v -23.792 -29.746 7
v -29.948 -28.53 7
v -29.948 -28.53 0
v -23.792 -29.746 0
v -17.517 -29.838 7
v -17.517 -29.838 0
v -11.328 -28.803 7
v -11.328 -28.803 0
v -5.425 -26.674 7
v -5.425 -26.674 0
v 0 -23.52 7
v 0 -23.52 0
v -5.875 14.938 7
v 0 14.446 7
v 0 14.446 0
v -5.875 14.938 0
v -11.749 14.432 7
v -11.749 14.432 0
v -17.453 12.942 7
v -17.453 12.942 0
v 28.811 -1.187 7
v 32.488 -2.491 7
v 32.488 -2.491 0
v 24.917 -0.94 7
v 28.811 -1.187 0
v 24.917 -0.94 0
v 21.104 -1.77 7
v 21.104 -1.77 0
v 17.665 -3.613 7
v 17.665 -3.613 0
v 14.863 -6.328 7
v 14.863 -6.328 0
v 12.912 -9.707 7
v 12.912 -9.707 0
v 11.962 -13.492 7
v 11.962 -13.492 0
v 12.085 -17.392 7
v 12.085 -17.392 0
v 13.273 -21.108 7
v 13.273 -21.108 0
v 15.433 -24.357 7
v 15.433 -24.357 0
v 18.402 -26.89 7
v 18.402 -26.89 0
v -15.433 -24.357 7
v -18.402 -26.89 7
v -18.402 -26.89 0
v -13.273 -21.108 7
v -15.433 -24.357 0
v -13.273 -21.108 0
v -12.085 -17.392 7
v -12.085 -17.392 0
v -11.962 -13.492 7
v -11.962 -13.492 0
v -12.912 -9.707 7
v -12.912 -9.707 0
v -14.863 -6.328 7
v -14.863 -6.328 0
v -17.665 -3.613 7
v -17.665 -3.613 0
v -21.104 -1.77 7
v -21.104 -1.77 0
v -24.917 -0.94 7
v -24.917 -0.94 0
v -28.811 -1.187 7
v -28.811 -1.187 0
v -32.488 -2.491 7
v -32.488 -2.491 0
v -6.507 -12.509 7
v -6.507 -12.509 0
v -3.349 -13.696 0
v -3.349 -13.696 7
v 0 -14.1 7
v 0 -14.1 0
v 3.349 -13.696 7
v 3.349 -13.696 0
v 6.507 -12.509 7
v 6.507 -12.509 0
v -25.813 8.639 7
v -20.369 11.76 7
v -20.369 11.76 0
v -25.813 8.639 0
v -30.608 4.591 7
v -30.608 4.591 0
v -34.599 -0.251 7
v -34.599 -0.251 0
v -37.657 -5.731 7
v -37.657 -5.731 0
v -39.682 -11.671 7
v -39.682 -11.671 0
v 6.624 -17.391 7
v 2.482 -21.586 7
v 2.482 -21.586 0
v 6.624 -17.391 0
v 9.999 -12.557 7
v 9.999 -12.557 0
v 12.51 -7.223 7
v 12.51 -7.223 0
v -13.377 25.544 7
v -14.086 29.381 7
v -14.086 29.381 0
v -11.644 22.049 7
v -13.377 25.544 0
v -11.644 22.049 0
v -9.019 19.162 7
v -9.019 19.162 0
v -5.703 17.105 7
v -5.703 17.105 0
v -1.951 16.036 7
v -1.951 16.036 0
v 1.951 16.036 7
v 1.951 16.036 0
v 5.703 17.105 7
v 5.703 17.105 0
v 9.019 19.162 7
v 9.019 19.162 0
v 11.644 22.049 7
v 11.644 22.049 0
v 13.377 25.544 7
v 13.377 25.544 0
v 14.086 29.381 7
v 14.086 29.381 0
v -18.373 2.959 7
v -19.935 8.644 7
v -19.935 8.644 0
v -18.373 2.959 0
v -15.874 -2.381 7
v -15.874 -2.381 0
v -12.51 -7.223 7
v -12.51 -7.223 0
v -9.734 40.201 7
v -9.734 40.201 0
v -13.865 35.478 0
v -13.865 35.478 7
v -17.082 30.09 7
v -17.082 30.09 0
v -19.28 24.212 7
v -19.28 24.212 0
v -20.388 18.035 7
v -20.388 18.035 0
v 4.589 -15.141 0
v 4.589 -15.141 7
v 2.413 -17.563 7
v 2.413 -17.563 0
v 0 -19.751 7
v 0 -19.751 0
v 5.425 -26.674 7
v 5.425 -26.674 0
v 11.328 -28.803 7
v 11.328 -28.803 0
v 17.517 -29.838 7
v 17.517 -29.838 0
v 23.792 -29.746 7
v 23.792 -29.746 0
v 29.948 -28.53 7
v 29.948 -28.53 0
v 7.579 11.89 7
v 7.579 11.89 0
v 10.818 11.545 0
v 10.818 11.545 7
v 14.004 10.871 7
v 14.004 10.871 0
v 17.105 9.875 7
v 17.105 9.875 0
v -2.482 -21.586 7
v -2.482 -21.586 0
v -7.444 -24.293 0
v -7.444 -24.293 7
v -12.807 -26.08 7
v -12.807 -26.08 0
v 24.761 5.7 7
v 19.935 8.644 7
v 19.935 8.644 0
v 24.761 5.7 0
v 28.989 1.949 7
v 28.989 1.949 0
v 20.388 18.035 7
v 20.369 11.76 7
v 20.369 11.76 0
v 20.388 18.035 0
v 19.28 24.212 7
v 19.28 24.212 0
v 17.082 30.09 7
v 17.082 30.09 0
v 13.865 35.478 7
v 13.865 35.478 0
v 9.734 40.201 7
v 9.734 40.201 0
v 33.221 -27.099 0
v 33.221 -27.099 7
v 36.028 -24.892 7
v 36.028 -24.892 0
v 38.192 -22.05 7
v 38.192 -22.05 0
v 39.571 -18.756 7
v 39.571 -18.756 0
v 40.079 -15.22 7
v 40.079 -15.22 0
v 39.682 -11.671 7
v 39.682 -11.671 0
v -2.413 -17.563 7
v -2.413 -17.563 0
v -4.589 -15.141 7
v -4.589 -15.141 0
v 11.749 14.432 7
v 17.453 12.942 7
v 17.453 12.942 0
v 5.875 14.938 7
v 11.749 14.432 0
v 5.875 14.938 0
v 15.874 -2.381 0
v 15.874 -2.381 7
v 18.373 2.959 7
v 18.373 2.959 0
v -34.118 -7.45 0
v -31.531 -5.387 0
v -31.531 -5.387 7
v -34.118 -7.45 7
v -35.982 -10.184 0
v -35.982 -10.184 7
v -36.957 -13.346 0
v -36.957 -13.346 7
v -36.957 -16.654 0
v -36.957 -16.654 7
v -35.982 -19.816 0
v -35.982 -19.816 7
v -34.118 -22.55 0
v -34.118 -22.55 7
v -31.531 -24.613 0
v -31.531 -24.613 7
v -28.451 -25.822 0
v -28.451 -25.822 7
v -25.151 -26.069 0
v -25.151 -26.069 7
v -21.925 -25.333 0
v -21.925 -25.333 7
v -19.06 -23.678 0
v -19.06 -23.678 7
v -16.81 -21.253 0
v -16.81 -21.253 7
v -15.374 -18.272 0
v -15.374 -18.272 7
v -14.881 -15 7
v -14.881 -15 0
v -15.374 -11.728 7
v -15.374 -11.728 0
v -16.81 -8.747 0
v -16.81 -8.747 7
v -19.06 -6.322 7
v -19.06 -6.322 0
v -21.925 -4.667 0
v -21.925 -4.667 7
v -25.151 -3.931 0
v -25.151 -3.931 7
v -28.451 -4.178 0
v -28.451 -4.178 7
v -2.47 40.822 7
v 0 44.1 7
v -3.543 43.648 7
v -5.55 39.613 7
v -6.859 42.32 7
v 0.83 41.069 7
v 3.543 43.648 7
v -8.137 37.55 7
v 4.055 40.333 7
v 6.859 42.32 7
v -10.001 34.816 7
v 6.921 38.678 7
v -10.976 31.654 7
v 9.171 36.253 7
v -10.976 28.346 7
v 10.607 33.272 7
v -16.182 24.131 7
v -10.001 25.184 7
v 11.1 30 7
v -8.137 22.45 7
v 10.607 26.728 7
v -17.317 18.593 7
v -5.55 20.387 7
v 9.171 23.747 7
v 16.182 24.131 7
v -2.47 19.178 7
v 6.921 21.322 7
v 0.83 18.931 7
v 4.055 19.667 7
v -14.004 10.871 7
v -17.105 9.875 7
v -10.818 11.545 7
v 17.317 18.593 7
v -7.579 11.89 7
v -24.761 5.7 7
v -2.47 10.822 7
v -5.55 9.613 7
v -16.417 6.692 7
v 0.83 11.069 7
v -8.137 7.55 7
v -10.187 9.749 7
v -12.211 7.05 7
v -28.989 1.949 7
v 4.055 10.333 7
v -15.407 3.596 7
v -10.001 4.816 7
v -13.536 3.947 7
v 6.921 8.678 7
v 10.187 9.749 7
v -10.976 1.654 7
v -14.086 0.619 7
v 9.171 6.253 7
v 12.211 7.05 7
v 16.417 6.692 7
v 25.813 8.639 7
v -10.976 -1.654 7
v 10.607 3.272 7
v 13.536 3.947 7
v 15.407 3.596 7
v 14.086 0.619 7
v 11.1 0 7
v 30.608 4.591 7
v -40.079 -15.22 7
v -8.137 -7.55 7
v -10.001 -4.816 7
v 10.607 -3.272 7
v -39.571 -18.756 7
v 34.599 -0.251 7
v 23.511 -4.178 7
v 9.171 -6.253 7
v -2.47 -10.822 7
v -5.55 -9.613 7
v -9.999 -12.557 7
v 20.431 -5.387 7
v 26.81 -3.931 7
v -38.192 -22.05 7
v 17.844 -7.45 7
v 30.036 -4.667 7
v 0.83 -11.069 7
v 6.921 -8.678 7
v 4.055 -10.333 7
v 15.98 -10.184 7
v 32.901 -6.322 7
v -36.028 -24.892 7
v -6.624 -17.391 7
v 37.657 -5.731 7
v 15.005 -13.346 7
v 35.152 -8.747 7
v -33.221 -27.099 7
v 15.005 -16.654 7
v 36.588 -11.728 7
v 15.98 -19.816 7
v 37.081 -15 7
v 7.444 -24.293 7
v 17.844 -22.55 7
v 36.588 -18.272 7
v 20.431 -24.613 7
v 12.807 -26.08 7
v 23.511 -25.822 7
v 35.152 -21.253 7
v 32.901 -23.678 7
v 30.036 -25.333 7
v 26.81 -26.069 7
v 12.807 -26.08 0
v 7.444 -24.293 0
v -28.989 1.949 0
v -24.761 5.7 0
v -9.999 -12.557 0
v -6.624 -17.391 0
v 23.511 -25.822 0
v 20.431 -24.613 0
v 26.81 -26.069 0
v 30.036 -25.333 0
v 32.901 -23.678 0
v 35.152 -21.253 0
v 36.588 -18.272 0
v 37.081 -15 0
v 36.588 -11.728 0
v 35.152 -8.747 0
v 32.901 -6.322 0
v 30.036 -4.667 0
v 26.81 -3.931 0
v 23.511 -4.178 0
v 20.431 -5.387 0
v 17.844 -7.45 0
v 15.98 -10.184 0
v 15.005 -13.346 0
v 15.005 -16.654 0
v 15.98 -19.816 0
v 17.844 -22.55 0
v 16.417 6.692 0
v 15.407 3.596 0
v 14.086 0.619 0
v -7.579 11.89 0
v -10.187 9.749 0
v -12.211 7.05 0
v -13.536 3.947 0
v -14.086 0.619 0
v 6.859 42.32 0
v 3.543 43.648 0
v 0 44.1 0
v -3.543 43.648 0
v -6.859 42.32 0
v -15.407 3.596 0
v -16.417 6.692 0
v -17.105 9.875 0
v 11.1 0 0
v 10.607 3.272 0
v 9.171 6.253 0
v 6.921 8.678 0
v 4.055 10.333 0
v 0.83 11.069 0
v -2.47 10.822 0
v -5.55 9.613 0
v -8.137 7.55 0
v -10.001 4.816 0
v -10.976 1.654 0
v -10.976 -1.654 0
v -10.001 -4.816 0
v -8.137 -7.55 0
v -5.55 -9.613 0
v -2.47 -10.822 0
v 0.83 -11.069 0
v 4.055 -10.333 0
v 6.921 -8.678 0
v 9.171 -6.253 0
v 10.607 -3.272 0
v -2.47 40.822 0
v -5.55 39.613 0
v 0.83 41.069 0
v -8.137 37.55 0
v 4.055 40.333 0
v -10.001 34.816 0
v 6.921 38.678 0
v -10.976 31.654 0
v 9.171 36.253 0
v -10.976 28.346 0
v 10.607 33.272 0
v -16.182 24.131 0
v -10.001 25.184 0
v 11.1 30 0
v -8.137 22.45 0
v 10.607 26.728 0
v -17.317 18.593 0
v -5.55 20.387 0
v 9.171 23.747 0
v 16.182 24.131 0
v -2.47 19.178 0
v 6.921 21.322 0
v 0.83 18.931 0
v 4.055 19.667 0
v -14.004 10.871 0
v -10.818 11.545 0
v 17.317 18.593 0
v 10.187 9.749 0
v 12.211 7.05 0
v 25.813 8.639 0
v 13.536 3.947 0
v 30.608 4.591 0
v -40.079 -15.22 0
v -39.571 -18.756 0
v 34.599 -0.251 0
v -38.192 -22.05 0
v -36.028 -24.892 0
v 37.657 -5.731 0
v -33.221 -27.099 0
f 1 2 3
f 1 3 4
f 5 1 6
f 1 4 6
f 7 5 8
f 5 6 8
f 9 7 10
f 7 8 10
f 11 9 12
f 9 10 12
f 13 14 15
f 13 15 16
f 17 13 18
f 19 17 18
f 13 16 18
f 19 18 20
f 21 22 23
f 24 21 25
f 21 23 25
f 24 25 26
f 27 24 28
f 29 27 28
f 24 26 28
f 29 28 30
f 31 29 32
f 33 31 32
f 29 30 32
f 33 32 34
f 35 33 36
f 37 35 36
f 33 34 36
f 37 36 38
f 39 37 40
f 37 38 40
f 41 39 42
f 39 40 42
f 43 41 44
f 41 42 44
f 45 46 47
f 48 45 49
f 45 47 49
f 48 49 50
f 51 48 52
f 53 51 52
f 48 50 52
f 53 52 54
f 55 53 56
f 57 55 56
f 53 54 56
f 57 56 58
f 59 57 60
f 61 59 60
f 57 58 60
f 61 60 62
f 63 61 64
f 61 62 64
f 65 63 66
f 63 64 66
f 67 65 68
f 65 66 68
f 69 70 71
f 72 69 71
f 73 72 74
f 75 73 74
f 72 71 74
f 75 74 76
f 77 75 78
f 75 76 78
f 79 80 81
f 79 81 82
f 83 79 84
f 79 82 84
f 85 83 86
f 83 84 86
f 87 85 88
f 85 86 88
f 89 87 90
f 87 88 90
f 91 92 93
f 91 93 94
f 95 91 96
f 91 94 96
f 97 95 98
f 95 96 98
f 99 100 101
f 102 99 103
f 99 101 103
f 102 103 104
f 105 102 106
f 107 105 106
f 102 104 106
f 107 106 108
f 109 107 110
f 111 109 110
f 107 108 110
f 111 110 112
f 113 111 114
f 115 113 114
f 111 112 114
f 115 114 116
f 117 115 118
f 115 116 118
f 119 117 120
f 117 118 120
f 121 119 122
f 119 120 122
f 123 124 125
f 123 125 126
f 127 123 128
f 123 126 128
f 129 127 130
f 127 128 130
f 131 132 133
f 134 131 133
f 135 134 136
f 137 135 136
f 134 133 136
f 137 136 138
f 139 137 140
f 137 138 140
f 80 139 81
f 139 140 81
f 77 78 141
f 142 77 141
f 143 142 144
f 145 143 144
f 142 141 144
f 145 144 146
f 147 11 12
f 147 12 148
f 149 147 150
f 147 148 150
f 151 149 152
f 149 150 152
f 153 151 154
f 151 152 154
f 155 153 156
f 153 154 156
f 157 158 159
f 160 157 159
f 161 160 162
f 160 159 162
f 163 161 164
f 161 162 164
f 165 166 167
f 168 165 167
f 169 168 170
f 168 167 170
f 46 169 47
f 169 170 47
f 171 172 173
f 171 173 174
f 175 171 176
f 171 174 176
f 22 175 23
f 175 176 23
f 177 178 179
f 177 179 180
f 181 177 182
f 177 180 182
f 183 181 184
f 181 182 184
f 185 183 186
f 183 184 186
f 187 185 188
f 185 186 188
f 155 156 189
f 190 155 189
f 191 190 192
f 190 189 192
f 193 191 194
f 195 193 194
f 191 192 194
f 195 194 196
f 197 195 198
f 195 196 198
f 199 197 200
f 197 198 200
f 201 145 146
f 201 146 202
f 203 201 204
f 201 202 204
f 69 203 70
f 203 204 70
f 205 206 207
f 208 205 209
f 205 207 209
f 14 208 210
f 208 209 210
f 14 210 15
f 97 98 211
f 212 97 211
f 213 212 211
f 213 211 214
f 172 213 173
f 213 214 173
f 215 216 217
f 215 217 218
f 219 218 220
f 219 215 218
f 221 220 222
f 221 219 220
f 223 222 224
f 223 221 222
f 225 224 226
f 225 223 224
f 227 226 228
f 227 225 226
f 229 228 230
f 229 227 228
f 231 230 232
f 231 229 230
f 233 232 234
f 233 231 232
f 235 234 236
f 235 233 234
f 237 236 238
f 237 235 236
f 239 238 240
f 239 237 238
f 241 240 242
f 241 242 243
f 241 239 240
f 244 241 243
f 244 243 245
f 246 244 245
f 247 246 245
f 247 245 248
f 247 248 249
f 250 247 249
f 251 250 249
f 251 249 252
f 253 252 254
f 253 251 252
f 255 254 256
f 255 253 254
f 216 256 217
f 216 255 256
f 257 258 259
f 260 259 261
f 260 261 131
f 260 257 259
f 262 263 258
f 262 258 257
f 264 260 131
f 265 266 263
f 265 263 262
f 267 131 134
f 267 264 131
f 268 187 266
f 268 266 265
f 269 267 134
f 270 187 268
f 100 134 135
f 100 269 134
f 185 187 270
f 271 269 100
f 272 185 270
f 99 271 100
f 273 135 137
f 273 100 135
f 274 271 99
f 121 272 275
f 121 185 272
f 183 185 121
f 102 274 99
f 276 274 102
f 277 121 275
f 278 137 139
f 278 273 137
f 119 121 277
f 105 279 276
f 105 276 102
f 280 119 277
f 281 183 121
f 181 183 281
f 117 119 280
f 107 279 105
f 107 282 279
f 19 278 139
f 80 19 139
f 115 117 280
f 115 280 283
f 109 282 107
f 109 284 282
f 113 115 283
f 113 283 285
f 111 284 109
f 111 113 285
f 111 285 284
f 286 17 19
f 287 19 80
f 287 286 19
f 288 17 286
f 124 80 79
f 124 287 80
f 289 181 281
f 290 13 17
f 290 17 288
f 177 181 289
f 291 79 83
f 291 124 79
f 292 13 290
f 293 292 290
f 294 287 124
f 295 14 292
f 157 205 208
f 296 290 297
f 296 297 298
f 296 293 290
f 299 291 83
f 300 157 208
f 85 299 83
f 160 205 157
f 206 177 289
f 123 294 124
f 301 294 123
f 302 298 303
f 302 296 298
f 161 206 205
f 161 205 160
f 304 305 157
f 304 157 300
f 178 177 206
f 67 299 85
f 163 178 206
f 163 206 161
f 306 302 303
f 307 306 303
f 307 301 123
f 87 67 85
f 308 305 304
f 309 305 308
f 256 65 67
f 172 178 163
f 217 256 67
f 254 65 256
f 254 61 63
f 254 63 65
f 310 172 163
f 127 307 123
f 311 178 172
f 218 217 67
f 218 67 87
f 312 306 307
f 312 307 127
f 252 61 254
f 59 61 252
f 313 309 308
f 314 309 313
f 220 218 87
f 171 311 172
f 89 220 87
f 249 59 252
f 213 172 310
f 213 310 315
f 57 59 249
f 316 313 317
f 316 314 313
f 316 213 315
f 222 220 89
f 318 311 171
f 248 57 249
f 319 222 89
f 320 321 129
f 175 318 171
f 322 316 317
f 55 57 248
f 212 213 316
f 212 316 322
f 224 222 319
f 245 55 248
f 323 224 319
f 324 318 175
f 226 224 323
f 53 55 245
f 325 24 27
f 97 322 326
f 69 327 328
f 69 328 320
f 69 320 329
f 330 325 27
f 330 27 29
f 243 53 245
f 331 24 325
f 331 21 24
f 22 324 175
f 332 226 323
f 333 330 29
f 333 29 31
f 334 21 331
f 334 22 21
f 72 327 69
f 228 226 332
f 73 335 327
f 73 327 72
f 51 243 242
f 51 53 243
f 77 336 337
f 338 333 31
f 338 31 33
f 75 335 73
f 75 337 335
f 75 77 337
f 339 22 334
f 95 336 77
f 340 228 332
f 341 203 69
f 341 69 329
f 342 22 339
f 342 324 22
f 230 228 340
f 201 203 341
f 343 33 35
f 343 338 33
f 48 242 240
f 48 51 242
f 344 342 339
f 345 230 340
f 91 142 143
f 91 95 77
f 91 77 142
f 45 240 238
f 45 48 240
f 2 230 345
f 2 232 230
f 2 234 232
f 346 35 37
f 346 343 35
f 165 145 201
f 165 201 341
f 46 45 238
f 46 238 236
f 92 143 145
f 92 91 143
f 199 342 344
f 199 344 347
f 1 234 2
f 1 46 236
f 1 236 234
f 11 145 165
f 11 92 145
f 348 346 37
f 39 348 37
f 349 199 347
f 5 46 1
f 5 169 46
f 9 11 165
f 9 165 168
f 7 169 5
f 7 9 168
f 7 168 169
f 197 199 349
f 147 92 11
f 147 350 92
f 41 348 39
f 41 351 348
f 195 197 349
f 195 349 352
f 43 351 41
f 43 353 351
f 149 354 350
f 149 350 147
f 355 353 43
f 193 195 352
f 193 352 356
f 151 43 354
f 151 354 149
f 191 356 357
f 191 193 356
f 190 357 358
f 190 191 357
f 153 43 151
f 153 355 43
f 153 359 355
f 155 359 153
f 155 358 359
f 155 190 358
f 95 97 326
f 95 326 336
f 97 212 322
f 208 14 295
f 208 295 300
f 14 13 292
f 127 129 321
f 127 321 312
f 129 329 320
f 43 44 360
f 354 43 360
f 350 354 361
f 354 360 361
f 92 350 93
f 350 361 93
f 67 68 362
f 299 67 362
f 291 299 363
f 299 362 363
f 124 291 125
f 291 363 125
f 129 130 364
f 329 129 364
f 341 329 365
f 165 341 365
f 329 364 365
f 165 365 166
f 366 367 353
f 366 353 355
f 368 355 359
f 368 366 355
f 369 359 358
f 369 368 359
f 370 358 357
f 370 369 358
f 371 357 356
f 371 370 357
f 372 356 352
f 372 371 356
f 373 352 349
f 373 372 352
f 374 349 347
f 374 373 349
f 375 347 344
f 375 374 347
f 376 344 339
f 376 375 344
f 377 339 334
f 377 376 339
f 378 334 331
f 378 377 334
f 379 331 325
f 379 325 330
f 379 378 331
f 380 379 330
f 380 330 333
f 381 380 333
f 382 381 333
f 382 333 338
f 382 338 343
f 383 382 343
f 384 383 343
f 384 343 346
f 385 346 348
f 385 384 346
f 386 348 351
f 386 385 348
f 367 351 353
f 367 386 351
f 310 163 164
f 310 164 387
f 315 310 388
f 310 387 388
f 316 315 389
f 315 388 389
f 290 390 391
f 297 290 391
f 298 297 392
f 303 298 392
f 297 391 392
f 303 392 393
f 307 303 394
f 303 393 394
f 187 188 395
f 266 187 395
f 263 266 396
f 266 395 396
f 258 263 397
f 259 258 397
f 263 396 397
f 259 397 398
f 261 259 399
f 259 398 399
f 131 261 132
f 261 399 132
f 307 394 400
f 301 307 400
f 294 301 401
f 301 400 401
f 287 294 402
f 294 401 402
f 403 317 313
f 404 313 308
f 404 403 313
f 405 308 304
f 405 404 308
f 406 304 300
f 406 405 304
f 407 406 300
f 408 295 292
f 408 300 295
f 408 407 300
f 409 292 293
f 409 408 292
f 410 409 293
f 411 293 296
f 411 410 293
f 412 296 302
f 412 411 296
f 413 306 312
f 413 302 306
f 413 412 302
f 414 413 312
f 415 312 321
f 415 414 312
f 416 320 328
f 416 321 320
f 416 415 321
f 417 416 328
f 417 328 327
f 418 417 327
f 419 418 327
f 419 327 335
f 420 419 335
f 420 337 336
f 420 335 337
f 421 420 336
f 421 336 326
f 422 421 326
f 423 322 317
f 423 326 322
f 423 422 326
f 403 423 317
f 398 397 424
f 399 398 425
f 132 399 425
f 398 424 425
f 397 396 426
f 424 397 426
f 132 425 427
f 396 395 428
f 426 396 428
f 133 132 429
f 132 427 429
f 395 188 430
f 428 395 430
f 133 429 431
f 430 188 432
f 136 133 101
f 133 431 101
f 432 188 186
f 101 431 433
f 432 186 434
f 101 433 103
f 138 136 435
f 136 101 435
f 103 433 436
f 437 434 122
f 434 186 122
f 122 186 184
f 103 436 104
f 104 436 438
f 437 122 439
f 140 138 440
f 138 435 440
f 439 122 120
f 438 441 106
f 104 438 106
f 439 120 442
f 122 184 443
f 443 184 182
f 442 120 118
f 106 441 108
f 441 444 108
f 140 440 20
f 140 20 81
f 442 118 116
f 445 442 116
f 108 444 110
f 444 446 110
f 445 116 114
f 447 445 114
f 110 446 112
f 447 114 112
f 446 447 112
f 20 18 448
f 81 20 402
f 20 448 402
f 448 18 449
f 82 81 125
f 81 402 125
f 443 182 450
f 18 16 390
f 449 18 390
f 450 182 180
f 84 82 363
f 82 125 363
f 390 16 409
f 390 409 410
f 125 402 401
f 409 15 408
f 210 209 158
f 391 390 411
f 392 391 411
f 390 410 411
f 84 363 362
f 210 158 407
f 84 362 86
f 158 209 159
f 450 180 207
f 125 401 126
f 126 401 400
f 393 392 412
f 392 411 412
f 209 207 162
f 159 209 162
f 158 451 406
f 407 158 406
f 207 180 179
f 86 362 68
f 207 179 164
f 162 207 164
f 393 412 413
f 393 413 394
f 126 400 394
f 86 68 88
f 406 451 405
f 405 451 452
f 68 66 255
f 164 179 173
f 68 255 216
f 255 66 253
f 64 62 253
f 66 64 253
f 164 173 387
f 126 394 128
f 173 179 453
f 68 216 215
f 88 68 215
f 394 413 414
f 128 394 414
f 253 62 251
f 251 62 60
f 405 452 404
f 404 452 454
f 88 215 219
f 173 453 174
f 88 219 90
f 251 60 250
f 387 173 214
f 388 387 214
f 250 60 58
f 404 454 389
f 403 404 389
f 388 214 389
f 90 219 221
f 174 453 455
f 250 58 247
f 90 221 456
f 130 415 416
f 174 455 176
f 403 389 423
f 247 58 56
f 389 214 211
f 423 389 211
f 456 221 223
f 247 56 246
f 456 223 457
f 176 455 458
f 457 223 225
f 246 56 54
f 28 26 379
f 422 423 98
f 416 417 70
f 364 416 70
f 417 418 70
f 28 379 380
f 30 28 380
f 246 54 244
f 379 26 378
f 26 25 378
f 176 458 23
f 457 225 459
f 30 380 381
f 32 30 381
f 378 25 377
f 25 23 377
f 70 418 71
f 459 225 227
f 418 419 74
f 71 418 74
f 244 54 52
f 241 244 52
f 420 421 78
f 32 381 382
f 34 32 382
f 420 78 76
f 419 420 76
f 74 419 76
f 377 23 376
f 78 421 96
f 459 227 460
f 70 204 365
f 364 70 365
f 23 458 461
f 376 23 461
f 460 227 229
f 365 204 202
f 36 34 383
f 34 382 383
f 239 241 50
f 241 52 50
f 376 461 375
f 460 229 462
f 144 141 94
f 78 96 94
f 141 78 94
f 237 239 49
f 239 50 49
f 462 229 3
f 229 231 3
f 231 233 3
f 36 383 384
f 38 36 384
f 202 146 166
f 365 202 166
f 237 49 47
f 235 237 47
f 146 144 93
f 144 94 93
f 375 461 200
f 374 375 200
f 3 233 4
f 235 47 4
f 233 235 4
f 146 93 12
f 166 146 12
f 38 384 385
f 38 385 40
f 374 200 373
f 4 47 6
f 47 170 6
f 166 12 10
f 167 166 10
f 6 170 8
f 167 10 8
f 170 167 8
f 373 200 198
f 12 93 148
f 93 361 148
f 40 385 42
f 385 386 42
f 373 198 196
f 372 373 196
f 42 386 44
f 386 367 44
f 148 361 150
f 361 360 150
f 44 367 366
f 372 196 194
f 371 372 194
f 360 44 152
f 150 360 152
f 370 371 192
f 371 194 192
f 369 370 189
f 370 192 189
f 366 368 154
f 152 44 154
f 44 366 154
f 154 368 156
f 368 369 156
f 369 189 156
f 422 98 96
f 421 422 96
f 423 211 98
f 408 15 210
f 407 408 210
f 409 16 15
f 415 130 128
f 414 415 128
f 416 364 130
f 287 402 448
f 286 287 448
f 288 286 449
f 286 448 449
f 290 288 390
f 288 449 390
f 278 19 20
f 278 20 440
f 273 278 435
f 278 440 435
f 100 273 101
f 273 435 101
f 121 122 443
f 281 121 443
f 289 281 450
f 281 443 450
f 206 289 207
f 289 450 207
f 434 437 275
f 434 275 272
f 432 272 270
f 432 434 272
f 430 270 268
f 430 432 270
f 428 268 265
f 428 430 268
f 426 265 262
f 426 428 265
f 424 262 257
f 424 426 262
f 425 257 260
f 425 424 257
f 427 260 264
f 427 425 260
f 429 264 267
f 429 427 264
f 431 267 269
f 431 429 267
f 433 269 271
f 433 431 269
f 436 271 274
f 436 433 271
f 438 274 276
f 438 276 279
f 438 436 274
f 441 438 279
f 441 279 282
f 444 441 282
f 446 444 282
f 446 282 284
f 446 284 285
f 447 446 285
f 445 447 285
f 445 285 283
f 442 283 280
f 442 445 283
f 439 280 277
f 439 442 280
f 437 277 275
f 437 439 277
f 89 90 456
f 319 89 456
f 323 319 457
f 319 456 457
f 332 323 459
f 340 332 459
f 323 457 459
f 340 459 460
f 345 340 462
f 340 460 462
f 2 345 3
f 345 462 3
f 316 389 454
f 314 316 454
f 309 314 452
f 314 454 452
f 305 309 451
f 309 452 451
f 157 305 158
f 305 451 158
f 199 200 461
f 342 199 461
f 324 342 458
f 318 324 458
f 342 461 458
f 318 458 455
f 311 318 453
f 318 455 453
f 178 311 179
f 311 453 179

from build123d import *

# Parameters (mm, degrees)
F0_R            = 11.1
F1_DEPTH        = 7
F1_COPIES_COUNT = 3


# Not quite as in the source:
# - a pattern or mirror of a feature is missing from the dataset's text; its kind, count and spacing are read off the source's solid


with BuildPart() as f1:
    # F0 (on Top) → F1 (new body)
    with BuildSketch(Plane.XY):
        with BuildLine():
            ThreePointArc((14.0864100033, 29.3810870676), (14.0966020914, 29.690468941), (14.1, 30))
            ThreePointArc((14.1, 30), (12.9626271297, 35.5479994499), (9.7340002984, 40.200943005))
            ThreePointArc((9.7340002984, 40.200943005), (0, 44.1), (-9.7340002984, 40.200943005))
            ThreePointArc((-9.7340002984, 40.200943005), (-13.0812960888, 35.2620996416), (-14.0864100033, 29.3810870676))
            ThreePointArc((-14.0864100033, 29.3810870676), (0, 15.9), (14.0864100033, 29.3810870676))
        make_face()
        with Locations((0, 30)):
            Circle(F0_R, mode=Mode.SUBTRACT)
        with BuildLine():
            ThreePointArc((9.7340002984, 40.200943005), (12.9626271297, 35.5479994499), (14.1, 30))
            ThreePointArc((14.1, 30), (14.0966020914, 29.690468941), (14.0864100033, 29.3810870676))
            ThreePointArc((14.0864100033, 29.3810870676), (17.5199942586, 15), (14.0864100033, 0.6189129324))
            ThreePointArc((14.0864100033, 0.6189129324), (14.0966020914, 0.309531059), (14.1, 0))
            ThreePointArc((14.1, 0), (12.9626271297, -5.5479994499), (9.7340002984, -10.200943005))
            ThreePointArc((9.7340002984, -10.200943005), (20.5199942586, 15), (9.7340002984, 40.200943005))
        make_face()
        with BuildLine():
            ThreePointArc((-9.7340002984, -10.200943005), (0, -14.1), (9.7340002984, -10.200943005))
            ThreePointArc((9.7340002984, -10.200943005), (12.9626271297, -5.5479994499), (14.1, 0))
            ThreePointArc((14.1, 0), (14.0966020914, 0.309531059), (14.0864100033, 0.6189129324))
            ThreePointArc((14.0864100033, 0.6189129324), (0, 14.1), (-14.0864100033, 0.6189129324))
            ThreePointArc((-14.0864100033, 0.6189129324), (-13.0812960888, -5.2620996416), (-9.7340002984, -10.200943005))
        make_face()
        Circle(F0_R, mode=Mode.SUBTRACT)
        with BuildLine():
            ThreePointArc((-14.0864100033, 29.3810870676), (-13.0812960888, 35.2620996416), (-9.7340002984, 40.200943005))
            ThreePointArc((-9.7340002984, 40.200943005), (-20.5199942586, 15), (-9.7340002984, -10.200943005))
            ThreePointArc((-9.7340002984, -10.200943005), (-13.0812960888, -5.2620996416), (-14.0864100033, 0.6189129324))
            ThreePointArc((-14.0864100033, 0.6189129324), (-17.5199942586, 15), (-14.0864100033, 29.3810870676))
        make_face()
    extrude(amount=F1_DEPTH)

    # F1_copies: F1 ×3 about axis
    f1_copies_axis = Axis((0, 0, 0), (0, 0, 1))


with BuildPart() as f1_1:
    add(f1.part)
    for i in range(1, F1_COPIES_COUNT):
        add(f1.part.rotate(f1_copies_axis, i * 360 / F1_COPIES_COUNT))


solid = f1_1.part
